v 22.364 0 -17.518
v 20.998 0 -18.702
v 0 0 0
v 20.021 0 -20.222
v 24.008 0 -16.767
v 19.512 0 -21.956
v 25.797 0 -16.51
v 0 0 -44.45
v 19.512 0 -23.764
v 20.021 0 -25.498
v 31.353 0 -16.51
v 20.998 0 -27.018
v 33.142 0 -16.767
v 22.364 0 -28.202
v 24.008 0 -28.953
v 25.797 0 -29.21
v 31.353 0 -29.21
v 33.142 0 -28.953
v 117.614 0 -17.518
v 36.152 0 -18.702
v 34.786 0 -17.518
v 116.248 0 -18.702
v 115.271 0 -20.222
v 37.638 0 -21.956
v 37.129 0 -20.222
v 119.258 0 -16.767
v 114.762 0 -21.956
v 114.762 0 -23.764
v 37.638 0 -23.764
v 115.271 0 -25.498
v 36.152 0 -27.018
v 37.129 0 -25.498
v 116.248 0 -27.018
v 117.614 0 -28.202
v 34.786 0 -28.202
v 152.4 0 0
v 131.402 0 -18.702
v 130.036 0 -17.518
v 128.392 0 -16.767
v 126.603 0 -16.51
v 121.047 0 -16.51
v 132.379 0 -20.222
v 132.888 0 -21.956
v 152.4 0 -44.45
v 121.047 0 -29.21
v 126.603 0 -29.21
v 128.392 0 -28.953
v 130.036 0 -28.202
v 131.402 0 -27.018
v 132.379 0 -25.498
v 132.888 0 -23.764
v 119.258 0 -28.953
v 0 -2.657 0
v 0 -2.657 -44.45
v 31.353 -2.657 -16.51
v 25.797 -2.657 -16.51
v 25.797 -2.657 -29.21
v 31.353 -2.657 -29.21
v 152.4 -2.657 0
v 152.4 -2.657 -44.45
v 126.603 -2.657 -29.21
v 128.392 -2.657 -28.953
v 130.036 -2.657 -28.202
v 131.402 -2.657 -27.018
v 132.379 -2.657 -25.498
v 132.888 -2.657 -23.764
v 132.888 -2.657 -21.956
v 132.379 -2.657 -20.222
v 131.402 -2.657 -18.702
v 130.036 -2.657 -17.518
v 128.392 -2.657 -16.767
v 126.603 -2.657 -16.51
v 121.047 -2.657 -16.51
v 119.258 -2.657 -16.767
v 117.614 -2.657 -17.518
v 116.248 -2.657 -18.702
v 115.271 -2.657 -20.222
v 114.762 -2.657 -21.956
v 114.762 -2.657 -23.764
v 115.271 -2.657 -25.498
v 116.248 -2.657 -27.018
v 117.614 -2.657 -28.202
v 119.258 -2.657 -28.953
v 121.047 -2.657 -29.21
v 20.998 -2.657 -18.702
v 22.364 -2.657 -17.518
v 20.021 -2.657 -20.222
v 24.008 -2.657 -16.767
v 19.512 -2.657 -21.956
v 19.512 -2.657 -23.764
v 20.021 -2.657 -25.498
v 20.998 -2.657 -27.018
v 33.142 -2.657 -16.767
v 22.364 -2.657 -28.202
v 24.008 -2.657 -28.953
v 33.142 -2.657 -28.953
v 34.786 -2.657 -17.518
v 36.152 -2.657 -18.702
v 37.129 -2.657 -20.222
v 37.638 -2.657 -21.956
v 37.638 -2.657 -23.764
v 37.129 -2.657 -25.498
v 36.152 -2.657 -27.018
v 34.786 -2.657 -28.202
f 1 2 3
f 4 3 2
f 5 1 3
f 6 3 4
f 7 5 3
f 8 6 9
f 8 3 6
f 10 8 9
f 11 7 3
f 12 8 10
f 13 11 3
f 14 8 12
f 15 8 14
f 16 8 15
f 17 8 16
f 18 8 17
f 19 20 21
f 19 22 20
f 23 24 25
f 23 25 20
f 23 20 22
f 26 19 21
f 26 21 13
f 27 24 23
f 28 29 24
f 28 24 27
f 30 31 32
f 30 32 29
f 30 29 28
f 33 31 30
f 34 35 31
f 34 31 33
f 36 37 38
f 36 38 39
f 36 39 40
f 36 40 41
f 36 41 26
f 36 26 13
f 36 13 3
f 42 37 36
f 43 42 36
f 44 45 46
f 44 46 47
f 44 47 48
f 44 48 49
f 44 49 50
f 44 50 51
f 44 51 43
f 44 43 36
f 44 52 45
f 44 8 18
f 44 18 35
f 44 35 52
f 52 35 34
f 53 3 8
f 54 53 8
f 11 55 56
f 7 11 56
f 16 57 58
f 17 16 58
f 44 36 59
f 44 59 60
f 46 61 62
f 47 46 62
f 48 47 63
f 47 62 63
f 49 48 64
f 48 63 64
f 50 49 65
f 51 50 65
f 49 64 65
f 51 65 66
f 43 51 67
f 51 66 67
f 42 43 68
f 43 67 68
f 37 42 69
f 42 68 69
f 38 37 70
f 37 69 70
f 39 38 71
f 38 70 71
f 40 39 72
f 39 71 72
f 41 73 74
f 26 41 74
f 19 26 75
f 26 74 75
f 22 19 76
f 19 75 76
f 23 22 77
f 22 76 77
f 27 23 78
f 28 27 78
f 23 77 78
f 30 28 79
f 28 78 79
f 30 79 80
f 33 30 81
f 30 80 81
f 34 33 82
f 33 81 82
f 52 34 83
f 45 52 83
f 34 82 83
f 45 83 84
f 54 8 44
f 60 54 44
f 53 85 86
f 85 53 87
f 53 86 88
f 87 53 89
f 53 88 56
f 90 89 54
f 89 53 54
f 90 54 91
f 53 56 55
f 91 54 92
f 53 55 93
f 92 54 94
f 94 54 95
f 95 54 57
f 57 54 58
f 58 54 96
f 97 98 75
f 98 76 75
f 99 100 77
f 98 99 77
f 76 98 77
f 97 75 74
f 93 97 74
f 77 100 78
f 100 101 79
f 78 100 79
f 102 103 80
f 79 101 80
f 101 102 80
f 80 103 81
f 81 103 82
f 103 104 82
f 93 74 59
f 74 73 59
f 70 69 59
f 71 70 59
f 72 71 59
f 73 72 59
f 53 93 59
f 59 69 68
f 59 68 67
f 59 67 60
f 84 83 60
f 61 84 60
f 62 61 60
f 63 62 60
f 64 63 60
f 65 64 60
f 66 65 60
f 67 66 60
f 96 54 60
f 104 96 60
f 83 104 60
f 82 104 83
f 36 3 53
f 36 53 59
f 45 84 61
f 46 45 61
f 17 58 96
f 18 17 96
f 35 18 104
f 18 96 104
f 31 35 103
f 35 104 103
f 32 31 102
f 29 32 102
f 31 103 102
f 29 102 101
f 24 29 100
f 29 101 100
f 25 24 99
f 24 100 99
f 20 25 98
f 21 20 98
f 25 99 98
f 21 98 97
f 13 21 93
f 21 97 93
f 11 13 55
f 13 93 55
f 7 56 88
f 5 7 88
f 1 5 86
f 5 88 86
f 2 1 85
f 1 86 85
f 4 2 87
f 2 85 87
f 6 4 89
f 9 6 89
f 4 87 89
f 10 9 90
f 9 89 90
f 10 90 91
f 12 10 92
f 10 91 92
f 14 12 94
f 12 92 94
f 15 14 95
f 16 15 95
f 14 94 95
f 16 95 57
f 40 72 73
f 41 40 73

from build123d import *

# Parameters (mm, degrees)
SKETCH1_W          = 152.4
SKETCH1_H          = 44.45
BASE_FLANGE1_DEPTH = 2.65684
CUT_EXTRUDE3_DEPTH = 159.772230881


# Sheet-metal steps are written as plain solids
with BuildPart() as part:
    # Sketch1 → Base-Flange1 (new body)
    with BuildSketch(Plane(origin=(0, 0, 0), x_dir=(1, 0, 0), z_dir=(0, 1, 0))):
        with Locations((76.2, 22.225)):
            Rectangle(SKETCH1_W, SKETCH1_H)
    extrude(amount=-BASE_FLANGE1_DEPTH)

    # Sketch10 → Cut-Extrude3 (cut, through all)
    with BuildSketch(Plane.XZ.offset(2.65684)):
        with BuildLine():
            Line((25.796875, -29.21), (31.353125, -29.21))
            ThreePointArc((31.353125, -29.21), (37.703125, -22.86), (31.353125, -16.51))
            Line((31.353125, -16.51), (25.796875, -16.51))
            ThreePointArc((25.796875, -16.51), (19.446875, -22.86), (25.796875, -29.21))
        make_face()
        with BuildLine():
            Line((121.046875, -29.21), (126.603125, -29.21))
            ThreePointArc((126.603125, -29.21), (132.953125, -22.86), (126.603125, -16.51))
            Line((126.603125, -16.51), (121.046875, -16.51))
            ThreePointArc((121.046875, -16.51), (114.696875, -22.86), (121.046875, -29.21))
        make_face()
    extrude(amount=-CUT_EXTRUDE3_DEPTH, mode=Mode.SUBTRACT)


solid = part.part
